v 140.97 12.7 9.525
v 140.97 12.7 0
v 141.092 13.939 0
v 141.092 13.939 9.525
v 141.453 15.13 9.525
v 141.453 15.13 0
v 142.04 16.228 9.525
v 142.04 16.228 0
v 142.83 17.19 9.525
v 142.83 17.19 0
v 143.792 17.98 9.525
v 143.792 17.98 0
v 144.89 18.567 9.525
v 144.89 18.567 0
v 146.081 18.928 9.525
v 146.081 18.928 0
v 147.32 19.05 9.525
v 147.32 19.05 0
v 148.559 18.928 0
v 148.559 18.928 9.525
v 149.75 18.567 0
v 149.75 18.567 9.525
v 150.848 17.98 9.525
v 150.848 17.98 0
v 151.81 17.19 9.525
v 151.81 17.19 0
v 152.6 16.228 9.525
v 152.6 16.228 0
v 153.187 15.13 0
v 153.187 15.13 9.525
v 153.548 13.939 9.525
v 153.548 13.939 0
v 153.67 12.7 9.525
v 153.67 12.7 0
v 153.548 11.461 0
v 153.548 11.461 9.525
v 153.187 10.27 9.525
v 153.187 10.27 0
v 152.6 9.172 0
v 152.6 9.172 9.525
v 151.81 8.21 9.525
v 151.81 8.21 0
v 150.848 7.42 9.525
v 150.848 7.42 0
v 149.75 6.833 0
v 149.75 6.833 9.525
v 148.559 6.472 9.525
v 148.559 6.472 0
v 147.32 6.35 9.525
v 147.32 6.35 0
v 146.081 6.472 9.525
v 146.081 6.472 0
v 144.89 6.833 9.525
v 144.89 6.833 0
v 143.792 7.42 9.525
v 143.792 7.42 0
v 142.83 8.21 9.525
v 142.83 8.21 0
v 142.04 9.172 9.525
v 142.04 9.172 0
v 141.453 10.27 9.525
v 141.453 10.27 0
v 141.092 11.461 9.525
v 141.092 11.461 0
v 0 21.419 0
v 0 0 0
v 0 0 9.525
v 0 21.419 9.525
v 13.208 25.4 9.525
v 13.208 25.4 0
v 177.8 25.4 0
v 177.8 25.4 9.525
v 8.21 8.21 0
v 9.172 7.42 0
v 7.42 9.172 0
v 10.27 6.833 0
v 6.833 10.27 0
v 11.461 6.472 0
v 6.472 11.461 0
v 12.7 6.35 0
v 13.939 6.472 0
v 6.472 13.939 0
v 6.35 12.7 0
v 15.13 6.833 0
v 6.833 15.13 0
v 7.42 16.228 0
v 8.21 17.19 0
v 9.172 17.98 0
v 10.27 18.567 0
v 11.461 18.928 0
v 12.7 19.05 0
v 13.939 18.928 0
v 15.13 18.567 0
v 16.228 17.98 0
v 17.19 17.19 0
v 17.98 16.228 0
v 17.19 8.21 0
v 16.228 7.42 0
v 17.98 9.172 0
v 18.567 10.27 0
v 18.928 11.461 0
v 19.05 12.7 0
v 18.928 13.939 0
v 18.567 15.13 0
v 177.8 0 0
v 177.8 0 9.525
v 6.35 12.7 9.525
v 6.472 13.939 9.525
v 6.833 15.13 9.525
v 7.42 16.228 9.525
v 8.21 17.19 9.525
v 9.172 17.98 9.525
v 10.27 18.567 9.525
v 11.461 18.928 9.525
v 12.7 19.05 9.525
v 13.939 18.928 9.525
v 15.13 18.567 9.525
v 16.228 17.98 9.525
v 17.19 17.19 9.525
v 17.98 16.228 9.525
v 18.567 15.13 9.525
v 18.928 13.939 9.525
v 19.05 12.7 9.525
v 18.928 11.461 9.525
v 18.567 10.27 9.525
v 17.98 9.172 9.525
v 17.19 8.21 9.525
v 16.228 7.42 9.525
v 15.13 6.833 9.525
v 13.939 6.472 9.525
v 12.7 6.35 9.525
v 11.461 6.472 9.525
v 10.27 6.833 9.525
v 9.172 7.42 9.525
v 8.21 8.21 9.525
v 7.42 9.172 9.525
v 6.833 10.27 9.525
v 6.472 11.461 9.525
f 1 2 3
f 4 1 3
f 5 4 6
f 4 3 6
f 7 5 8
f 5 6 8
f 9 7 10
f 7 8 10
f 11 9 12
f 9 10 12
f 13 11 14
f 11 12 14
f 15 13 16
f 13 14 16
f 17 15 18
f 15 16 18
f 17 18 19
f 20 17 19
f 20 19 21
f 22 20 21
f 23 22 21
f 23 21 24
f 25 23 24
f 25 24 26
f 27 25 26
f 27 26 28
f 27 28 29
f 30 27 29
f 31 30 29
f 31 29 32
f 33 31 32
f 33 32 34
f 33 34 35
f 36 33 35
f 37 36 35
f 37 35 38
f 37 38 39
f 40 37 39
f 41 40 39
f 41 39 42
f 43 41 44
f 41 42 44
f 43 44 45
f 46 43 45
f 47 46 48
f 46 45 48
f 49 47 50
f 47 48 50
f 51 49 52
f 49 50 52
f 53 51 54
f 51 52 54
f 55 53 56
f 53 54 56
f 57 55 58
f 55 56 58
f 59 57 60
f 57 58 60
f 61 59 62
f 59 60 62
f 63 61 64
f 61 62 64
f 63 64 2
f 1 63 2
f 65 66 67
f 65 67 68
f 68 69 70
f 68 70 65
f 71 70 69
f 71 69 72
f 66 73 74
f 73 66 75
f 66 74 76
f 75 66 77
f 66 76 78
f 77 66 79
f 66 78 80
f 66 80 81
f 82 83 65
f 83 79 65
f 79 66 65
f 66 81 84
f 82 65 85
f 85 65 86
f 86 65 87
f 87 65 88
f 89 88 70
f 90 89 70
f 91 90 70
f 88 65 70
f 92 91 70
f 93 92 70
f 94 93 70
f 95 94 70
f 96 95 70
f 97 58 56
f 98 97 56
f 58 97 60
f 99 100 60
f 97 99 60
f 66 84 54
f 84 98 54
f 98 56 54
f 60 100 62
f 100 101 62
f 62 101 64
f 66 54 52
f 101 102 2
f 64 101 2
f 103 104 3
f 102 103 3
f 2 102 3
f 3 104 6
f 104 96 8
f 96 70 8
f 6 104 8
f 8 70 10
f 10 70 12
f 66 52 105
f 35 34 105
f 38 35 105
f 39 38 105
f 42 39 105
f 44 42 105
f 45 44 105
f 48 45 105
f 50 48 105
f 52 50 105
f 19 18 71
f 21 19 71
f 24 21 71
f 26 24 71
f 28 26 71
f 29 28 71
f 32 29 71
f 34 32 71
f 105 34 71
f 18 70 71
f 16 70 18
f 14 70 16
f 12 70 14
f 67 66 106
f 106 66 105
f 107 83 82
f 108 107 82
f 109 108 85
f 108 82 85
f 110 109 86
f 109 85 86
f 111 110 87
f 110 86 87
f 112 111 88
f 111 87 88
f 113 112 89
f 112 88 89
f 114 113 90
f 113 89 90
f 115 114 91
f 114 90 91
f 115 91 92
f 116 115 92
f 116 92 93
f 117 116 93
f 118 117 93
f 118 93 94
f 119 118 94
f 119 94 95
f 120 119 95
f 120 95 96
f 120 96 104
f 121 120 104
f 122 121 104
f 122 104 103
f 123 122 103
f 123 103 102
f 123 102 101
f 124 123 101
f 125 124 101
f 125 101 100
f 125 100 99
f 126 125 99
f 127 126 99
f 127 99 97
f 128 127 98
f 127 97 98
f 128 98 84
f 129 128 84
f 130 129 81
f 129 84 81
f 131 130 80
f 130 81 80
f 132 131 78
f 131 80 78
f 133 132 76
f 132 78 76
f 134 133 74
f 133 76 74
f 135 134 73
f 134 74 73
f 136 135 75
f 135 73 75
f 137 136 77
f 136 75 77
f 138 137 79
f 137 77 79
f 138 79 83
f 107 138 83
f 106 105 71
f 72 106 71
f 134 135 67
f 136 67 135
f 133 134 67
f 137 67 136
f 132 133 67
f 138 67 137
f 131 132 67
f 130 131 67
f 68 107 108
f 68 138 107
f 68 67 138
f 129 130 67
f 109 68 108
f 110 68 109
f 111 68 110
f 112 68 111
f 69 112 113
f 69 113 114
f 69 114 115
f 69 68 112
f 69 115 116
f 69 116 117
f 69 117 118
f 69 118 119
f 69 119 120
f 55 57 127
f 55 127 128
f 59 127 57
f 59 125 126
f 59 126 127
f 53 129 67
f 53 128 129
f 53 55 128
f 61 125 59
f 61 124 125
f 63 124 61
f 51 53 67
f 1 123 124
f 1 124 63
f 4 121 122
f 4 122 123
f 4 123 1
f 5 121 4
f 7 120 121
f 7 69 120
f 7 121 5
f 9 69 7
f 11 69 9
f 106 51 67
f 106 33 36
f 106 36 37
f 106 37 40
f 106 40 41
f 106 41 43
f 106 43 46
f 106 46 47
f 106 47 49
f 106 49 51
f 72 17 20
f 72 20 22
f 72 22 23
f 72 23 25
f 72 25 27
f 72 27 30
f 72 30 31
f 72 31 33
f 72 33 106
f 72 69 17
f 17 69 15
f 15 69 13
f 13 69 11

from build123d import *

# Parameters (mm, degrees)
SKETCH1_W                  = 177.8
SKETCH1_H                  = 25.4
BOSS_EXTRUDE1_DEPTH        = 9.525
F_1_2_0_5_DIAMETER_HOLE1_D = 12.7
CUT_EXTRUDE1_DEPTH         = 180.857514786


with BuildPart() as part:
    # Sketch1 → Boss-Extrude1 (new body)
    with BuildSketch(Plane.XY):
        with Locations((88.9, 12.7)):
            Rectangle(SKETCH1_W, SKETCH1_H)
    extrude(amount=BOSS_EXTRUDE1_DEPTH)

    # 1/2 (0.5) Diameter Hole1 (through all)
    with Locations(Plane.XY.offset(9.525)):
        with Locations((12.7, 12.7), (147.32, 12.7)):
            Hole(F_1_2_0_5_DIAMETER_HOLE1_D / 2)

    # Sketch5 → Cut-Extrude1 (cut, through all)
    with BuildSketch(Plane.XY.offset(9.525)):
        Polygon((13.208, 25.4), (0, 21.419090106), (0, 25.4), align=None)
    extrude(amount=-CUT_EXTRUDE1_DEPTH, mode=Mode.SUBTRACT)


solid = part.part
